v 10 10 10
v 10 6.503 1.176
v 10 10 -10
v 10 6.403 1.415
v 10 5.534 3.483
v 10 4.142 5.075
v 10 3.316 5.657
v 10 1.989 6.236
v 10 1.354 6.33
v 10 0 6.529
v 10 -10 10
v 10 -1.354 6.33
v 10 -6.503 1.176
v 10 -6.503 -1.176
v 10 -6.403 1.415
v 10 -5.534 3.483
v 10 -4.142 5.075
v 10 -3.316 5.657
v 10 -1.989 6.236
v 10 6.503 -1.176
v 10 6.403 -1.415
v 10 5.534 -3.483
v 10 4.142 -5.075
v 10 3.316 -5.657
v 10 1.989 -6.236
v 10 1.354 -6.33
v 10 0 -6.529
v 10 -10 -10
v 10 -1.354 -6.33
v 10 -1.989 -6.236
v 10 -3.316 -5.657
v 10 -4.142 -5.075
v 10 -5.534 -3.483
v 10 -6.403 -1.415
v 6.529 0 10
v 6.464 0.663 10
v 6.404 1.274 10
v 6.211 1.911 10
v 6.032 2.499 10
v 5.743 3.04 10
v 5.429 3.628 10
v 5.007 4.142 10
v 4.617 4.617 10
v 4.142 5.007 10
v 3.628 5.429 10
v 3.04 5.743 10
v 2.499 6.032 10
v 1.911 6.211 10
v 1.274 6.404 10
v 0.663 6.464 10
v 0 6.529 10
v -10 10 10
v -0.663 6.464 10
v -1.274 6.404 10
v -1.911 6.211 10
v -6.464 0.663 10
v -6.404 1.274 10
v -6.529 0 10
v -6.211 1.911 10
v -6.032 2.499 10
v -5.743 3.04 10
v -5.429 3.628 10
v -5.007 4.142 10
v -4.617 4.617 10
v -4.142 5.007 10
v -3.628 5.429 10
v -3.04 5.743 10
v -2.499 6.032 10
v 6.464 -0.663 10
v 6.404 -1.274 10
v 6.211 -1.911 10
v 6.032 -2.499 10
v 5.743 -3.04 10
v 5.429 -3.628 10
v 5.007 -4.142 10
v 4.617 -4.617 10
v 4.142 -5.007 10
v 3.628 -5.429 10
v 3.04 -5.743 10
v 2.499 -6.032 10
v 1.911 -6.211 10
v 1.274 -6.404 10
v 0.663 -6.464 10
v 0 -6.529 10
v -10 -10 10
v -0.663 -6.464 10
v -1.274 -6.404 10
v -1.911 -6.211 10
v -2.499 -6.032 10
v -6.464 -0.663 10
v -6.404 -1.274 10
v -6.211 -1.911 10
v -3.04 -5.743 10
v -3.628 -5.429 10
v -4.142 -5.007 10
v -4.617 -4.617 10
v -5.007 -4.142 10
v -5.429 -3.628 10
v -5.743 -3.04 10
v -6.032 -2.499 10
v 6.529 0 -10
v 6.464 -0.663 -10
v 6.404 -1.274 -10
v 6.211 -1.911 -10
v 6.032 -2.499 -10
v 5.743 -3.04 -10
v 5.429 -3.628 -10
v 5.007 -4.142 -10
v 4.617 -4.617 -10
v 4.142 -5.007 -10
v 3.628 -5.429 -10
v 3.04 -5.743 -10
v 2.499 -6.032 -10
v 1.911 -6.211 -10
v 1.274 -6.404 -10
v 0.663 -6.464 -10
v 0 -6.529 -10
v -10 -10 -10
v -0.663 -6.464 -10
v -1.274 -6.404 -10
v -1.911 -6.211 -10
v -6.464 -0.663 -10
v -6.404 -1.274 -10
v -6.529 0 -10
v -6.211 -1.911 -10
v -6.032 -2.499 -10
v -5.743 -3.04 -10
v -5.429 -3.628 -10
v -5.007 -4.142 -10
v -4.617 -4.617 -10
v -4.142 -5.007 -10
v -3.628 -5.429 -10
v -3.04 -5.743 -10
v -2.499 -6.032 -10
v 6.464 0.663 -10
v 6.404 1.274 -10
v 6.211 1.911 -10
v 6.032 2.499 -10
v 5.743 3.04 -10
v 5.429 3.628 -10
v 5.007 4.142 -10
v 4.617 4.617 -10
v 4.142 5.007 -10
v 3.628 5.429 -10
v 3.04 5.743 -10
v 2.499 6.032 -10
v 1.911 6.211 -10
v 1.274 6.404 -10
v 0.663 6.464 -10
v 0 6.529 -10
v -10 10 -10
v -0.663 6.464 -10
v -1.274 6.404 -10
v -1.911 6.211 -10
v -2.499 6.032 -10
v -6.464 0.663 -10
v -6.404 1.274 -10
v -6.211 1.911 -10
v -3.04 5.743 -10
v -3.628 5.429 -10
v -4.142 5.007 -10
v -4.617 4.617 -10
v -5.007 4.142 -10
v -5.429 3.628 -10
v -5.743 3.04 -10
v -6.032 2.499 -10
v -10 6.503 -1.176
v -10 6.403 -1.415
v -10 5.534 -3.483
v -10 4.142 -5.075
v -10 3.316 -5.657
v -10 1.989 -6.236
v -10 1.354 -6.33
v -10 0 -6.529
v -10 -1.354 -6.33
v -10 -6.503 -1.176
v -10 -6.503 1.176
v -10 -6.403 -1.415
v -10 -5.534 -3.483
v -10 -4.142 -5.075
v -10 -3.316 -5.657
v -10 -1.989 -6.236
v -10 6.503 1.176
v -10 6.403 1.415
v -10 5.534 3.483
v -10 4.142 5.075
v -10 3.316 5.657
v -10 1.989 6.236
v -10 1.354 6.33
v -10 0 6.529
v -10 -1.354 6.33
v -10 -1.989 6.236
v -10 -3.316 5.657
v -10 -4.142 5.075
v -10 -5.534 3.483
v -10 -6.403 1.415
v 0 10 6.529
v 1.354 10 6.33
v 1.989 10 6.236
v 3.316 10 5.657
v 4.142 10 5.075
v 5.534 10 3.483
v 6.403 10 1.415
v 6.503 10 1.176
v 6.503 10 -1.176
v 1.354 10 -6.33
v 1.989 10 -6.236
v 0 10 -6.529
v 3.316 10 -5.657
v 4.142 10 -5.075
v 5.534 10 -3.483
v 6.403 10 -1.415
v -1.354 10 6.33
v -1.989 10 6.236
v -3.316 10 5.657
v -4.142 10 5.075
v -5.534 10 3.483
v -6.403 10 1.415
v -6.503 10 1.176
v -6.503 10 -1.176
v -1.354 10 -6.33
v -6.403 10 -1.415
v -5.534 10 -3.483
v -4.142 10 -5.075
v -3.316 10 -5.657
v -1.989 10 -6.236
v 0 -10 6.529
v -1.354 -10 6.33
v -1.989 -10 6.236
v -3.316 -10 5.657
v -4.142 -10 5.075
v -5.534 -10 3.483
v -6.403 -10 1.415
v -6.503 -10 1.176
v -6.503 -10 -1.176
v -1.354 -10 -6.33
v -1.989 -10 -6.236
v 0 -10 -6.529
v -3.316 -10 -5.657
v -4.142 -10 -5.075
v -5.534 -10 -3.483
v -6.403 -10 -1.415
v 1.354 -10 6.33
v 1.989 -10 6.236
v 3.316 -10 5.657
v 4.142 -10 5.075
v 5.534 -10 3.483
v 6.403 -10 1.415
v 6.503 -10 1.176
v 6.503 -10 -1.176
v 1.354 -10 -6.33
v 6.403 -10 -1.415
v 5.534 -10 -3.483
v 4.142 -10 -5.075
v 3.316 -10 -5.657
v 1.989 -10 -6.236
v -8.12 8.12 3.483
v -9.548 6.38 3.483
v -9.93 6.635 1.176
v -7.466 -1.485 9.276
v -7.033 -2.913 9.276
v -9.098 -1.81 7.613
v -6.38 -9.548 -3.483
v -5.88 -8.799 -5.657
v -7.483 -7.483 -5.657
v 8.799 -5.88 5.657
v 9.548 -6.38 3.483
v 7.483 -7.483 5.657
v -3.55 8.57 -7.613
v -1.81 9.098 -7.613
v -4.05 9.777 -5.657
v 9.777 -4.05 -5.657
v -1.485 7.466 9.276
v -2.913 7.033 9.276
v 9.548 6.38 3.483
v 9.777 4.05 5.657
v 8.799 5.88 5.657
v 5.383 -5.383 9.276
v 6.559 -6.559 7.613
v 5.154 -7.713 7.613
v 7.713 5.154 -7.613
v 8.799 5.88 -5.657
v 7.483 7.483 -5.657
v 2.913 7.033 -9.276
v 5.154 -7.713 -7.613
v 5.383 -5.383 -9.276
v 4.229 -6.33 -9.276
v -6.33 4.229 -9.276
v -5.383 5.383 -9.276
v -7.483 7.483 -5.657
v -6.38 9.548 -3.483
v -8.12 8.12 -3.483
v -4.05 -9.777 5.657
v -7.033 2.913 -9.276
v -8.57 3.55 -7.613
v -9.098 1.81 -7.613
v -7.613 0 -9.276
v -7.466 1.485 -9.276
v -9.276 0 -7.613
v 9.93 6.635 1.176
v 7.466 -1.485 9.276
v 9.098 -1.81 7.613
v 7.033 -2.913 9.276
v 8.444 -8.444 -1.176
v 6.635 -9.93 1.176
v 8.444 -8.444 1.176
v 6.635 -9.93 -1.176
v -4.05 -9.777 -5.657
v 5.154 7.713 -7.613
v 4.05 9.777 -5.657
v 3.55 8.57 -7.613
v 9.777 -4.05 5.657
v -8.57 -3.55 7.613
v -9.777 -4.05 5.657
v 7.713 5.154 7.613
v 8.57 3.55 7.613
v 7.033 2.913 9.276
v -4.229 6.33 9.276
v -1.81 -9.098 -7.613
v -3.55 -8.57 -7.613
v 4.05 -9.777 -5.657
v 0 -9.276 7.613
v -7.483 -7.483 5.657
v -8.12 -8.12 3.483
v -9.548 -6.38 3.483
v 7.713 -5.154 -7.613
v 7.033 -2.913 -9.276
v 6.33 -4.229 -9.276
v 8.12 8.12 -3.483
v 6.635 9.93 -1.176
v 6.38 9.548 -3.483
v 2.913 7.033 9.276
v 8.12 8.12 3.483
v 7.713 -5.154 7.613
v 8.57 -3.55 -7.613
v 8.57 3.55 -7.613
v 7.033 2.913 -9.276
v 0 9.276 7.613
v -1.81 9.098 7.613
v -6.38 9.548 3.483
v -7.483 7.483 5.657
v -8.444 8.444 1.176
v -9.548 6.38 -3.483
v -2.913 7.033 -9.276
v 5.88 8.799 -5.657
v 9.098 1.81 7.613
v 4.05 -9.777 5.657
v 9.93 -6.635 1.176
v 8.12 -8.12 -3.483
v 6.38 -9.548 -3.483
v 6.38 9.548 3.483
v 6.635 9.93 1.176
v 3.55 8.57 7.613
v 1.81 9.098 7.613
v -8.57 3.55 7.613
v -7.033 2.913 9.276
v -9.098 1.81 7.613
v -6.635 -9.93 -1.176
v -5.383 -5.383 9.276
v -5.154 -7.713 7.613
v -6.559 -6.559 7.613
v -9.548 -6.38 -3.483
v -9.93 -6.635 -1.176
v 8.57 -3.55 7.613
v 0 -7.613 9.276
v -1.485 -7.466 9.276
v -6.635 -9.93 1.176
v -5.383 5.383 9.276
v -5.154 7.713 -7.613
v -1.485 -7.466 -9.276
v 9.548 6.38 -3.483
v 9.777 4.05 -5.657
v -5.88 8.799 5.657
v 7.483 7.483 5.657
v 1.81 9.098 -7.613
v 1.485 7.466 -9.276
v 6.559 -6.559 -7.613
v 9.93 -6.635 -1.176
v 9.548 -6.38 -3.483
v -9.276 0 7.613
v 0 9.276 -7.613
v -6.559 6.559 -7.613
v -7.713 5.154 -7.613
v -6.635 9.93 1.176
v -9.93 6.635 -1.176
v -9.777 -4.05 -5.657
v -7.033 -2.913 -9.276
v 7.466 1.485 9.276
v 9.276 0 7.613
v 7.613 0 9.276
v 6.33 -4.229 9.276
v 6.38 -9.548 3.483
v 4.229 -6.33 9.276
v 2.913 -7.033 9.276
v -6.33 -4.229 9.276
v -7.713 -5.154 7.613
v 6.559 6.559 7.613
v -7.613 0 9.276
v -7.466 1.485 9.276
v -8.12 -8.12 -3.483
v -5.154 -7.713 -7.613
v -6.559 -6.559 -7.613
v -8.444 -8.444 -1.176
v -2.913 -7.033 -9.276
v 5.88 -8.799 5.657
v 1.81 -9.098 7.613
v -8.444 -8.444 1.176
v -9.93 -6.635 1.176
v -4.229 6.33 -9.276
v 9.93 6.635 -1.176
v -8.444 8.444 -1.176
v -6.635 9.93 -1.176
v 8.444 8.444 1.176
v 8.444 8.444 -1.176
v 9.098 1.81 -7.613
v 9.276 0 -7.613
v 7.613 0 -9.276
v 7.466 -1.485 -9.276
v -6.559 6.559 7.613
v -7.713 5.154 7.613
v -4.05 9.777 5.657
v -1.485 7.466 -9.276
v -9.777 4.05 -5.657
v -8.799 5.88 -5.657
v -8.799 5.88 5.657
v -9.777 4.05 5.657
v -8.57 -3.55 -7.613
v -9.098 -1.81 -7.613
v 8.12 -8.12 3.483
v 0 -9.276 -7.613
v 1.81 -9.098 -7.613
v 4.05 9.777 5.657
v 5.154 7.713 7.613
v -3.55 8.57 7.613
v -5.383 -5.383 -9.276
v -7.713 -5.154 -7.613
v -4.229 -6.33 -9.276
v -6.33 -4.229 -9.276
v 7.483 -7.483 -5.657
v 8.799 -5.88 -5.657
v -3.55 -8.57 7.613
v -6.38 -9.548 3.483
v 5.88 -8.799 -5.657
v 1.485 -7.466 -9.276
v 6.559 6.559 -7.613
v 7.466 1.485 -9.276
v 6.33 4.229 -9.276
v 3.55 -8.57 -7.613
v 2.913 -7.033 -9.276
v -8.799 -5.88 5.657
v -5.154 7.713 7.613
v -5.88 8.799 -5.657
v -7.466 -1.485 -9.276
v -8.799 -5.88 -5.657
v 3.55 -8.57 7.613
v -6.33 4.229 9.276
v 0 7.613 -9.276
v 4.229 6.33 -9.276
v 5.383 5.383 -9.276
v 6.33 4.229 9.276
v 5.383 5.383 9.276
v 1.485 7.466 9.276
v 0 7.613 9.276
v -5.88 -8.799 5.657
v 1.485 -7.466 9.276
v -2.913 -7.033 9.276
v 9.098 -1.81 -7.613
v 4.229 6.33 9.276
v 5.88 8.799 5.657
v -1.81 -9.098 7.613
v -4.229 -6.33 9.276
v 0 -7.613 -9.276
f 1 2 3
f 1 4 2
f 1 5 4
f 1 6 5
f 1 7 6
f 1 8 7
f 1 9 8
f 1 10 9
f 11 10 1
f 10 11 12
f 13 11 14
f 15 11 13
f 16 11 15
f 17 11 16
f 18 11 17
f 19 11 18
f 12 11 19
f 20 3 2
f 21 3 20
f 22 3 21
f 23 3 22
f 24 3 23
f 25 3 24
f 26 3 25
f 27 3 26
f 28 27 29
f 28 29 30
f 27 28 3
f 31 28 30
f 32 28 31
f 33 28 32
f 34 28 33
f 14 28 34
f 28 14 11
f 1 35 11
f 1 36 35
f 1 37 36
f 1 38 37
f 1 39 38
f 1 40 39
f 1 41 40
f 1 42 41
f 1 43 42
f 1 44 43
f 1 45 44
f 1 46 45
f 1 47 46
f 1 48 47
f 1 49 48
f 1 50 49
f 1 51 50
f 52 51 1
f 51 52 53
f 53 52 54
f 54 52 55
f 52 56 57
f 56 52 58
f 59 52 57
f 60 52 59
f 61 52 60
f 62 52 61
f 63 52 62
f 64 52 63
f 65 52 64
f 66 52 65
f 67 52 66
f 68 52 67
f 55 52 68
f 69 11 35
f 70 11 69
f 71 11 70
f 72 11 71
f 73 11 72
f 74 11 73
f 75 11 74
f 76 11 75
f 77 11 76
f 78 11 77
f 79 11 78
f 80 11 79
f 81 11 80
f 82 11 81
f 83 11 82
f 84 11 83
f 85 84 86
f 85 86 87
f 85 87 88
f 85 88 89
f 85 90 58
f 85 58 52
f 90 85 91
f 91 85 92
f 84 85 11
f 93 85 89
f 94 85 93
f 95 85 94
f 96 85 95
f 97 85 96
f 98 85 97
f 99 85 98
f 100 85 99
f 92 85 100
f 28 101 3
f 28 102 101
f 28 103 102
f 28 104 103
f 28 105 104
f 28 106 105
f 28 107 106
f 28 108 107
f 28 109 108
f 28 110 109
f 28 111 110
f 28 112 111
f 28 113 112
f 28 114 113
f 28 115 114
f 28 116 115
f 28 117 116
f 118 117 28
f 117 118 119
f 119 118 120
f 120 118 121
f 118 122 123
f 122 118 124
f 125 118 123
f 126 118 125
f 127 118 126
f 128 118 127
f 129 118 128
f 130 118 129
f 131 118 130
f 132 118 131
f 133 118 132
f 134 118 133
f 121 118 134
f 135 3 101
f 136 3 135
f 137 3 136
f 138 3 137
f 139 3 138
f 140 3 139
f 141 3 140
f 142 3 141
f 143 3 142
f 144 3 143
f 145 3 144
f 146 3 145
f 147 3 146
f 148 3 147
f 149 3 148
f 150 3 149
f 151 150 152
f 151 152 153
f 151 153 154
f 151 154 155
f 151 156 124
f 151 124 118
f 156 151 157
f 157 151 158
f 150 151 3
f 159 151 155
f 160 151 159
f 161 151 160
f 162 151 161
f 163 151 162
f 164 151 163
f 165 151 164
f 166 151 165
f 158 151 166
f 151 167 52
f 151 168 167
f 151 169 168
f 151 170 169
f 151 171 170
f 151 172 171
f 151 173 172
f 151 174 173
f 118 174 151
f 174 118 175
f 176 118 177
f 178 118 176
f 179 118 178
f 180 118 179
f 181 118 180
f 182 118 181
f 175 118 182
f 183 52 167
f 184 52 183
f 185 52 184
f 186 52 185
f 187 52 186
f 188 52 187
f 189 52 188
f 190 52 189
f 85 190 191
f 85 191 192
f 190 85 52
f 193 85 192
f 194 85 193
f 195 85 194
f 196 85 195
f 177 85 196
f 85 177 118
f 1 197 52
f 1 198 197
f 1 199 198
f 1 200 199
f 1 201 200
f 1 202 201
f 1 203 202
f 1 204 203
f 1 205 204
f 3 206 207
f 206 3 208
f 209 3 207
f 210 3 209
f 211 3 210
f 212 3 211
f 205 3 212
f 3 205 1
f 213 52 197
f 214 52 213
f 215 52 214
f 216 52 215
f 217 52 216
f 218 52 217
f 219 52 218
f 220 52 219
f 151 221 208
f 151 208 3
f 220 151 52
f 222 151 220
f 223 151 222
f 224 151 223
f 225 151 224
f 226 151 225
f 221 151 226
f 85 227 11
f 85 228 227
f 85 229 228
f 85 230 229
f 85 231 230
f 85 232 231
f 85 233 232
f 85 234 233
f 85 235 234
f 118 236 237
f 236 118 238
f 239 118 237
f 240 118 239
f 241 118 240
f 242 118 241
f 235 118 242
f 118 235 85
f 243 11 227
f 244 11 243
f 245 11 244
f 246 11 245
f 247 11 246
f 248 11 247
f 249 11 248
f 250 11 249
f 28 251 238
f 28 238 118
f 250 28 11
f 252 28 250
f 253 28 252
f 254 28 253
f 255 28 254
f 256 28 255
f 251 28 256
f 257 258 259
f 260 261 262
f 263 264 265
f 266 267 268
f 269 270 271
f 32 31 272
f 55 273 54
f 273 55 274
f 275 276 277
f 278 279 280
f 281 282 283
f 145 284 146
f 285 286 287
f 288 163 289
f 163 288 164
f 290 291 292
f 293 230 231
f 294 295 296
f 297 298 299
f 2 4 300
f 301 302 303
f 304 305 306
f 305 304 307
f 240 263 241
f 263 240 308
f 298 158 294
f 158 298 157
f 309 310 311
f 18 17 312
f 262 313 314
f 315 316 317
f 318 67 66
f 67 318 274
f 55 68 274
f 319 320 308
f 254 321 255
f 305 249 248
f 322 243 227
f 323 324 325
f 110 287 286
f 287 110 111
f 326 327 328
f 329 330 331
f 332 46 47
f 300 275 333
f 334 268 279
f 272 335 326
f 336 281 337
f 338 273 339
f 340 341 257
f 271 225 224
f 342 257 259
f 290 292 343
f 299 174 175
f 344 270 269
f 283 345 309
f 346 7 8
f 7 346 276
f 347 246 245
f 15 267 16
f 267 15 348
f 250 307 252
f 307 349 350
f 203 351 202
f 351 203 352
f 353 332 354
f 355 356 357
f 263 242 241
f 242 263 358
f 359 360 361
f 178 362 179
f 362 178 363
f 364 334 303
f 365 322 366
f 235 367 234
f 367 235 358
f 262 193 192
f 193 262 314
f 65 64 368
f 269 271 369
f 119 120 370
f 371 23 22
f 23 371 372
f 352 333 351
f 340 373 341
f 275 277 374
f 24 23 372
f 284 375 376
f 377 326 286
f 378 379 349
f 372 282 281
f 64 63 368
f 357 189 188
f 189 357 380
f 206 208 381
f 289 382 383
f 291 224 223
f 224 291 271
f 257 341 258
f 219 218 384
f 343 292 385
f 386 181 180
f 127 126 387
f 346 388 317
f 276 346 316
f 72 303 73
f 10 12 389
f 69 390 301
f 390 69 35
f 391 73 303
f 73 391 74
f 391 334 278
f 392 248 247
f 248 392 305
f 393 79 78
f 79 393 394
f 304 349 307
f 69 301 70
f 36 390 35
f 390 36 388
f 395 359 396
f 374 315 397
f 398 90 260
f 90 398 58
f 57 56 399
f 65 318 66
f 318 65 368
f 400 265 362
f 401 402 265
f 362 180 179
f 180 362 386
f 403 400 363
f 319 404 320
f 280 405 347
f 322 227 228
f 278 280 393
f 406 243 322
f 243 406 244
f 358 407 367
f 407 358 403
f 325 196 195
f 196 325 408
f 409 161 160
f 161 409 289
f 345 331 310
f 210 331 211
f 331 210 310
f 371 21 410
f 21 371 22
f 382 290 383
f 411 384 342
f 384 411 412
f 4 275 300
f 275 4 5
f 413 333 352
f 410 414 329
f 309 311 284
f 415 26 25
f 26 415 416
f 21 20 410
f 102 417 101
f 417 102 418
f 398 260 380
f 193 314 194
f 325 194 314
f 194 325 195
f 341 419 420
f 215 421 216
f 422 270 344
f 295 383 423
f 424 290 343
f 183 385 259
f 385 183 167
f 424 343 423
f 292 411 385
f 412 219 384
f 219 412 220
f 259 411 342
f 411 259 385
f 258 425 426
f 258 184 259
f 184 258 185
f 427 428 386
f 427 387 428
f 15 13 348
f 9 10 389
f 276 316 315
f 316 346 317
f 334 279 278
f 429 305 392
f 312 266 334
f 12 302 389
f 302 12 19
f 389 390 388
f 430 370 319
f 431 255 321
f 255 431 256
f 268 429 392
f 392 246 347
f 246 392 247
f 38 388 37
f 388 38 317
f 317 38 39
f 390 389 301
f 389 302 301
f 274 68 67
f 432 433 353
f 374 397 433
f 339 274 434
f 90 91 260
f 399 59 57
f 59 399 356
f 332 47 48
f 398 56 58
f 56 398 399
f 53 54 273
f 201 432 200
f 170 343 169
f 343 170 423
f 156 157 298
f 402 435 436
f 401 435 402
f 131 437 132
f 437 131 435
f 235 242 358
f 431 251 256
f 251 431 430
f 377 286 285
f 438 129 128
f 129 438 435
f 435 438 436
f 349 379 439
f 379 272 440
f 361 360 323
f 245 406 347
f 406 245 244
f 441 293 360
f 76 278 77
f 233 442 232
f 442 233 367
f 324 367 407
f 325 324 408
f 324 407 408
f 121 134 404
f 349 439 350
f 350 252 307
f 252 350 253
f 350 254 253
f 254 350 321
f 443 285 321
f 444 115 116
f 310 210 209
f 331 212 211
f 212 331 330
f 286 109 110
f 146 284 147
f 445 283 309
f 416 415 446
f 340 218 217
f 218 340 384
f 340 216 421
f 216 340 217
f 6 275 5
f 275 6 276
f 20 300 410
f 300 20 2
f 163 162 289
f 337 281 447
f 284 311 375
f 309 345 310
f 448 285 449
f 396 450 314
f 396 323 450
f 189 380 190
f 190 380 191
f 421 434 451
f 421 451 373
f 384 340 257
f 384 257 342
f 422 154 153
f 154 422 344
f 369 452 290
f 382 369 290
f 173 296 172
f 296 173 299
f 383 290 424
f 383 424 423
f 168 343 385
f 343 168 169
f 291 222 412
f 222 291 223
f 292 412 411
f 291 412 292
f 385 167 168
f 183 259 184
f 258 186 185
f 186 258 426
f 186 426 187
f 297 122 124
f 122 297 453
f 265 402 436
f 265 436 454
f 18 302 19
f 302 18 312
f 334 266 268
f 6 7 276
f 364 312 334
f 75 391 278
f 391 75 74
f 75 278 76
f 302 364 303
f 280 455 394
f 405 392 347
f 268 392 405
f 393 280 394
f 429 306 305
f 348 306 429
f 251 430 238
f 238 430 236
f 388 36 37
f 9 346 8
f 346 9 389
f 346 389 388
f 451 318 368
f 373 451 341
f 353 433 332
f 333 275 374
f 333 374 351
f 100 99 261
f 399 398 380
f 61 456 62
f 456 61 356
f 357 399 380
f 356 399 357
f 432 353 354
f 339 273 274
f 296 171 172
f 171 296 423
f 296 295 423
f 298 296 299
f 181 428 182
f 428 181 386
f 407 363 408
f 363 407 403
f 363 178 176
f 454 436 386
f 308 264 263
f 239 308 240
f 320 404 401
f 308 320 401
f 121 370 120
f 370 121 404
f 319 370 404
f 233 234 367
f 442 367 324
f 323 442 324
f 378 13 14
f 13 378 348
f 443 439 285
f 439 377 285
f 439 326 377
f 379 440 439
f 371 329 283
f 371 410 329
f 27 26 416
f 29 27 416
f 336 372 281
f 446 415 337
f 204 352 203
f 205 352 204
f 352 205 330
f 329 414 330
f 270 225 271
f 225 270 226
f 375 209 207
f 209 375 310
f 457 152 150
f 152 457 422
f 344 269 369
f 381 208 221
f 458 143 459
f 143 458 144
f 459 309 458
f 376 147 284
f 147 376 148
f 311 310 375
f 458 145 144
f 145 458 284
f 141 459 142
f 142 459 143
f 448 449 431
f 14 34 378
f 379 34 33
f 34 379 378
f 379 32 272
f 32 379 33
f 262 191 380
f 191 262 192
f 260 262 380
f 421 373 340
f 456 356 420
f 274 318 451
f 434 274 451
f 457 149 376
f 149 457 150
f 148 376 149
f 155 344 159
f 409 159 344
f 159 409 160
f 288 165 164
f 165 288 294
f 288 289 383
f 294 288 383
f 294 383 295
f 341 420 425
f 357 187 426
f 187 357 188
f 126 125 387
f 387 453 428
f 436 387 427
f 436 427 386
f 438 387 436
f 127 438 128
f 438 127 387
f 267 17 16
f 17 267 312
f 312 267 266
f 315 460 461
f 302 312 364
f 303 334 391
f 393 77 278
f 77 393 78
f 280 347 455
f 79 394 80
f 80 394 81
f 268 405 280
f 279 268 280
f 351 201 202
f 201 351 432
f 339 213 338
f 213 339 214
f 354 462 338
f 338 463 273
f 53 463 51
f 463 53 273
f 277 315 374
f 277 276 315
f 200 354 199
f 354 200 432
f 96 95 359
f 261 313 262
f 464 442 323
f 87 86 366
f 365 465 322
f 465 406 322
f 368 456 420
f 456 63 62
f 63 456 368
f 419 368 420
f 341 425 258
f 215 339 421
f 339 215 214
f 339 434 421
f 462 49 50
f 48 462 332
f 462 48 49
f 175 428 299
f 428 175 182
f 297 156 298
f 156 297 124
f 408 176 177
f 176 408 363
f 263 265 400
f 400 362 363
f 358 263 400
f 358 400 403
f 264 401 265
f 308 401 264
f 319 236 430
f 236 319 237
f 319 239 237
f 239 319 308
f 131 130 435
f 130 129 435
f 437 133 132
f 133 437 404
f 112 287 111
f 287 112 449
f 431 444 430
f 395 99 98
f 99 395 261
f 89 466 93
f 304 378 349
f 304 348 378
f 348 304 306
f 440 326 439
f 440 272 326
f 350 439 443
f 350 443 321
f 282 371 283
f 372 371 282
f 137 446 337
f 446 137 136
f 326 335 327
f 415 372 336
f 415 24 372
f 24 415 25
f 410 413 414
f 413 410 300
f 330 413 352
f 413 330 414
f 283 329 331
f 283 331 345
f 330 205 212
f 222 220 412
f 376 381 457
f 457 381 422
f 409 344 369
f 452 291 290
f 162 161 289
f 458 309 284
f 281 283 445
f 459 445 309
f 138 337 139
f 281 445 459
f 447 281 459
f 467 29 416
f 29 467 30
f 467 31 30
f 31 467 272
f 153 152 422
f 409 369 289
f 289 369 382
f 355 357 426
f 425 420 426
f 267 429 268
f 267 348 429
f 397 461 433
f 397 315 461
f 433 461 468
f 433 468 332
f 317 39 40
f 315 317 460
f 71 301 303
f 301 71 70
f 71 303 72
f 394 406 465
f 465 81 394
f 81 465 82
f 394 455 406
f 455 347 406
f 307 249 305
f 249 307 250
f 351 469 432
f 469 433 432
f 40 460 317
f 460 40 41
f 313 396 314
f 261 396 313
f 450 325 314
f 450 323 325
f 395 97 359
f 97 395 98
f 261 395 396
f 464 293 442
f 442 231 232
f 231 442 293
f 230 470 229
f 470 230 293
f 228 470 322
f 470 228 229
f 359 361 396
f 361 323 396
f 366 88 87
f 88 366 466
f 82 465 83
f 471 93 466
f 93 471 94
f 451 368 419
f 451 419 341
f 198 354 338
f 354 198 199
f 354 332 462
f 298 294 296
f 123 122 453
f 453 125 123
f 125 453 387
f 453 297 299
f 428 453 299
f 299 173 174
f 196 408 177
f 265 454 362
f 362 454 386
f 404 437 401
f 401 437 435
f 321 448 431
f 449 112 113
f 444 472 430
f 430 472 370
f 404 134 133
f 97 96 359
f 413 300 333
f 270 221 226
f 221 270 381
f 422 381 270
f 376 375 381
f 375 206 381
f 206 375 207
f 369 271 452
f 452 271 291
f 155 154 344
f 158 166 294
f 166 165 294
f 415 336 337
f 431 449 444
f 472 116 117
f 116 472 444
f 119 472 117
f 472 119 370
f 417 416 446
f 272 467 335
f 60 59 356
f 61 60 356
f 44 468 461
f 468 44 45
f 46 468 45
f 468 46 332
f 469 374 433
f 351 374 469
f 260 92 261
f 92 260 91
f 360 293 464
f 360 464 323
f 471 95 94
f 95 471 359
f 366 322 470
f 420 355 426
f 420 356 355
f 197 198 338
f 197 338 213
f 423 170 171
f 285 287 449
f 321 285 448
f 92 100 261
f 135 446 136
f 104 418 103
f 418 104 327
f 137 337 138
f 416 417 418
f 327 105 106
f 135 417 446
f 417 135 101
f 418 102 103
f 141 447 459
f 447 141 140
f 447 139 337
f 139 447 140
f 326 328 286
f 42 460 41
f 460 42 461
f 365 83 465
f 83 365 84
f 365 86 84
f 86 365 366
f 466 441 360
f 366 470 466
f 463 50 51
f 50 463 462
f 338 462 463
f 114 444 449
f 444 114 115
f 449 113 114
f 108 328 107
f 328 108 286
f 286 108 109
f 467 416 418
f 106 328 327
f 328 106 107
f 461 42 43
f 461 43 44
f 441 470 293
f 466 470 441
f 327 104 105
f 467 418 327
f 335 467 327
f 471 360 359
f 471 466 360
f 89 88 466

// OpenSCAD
// Cube de 20 centre, evide par une sphere de rayon 12 qui perce ses six faces.
difference() {
    cube(20, center = true);
    sphere(r = 12, $fn = 32);
}
